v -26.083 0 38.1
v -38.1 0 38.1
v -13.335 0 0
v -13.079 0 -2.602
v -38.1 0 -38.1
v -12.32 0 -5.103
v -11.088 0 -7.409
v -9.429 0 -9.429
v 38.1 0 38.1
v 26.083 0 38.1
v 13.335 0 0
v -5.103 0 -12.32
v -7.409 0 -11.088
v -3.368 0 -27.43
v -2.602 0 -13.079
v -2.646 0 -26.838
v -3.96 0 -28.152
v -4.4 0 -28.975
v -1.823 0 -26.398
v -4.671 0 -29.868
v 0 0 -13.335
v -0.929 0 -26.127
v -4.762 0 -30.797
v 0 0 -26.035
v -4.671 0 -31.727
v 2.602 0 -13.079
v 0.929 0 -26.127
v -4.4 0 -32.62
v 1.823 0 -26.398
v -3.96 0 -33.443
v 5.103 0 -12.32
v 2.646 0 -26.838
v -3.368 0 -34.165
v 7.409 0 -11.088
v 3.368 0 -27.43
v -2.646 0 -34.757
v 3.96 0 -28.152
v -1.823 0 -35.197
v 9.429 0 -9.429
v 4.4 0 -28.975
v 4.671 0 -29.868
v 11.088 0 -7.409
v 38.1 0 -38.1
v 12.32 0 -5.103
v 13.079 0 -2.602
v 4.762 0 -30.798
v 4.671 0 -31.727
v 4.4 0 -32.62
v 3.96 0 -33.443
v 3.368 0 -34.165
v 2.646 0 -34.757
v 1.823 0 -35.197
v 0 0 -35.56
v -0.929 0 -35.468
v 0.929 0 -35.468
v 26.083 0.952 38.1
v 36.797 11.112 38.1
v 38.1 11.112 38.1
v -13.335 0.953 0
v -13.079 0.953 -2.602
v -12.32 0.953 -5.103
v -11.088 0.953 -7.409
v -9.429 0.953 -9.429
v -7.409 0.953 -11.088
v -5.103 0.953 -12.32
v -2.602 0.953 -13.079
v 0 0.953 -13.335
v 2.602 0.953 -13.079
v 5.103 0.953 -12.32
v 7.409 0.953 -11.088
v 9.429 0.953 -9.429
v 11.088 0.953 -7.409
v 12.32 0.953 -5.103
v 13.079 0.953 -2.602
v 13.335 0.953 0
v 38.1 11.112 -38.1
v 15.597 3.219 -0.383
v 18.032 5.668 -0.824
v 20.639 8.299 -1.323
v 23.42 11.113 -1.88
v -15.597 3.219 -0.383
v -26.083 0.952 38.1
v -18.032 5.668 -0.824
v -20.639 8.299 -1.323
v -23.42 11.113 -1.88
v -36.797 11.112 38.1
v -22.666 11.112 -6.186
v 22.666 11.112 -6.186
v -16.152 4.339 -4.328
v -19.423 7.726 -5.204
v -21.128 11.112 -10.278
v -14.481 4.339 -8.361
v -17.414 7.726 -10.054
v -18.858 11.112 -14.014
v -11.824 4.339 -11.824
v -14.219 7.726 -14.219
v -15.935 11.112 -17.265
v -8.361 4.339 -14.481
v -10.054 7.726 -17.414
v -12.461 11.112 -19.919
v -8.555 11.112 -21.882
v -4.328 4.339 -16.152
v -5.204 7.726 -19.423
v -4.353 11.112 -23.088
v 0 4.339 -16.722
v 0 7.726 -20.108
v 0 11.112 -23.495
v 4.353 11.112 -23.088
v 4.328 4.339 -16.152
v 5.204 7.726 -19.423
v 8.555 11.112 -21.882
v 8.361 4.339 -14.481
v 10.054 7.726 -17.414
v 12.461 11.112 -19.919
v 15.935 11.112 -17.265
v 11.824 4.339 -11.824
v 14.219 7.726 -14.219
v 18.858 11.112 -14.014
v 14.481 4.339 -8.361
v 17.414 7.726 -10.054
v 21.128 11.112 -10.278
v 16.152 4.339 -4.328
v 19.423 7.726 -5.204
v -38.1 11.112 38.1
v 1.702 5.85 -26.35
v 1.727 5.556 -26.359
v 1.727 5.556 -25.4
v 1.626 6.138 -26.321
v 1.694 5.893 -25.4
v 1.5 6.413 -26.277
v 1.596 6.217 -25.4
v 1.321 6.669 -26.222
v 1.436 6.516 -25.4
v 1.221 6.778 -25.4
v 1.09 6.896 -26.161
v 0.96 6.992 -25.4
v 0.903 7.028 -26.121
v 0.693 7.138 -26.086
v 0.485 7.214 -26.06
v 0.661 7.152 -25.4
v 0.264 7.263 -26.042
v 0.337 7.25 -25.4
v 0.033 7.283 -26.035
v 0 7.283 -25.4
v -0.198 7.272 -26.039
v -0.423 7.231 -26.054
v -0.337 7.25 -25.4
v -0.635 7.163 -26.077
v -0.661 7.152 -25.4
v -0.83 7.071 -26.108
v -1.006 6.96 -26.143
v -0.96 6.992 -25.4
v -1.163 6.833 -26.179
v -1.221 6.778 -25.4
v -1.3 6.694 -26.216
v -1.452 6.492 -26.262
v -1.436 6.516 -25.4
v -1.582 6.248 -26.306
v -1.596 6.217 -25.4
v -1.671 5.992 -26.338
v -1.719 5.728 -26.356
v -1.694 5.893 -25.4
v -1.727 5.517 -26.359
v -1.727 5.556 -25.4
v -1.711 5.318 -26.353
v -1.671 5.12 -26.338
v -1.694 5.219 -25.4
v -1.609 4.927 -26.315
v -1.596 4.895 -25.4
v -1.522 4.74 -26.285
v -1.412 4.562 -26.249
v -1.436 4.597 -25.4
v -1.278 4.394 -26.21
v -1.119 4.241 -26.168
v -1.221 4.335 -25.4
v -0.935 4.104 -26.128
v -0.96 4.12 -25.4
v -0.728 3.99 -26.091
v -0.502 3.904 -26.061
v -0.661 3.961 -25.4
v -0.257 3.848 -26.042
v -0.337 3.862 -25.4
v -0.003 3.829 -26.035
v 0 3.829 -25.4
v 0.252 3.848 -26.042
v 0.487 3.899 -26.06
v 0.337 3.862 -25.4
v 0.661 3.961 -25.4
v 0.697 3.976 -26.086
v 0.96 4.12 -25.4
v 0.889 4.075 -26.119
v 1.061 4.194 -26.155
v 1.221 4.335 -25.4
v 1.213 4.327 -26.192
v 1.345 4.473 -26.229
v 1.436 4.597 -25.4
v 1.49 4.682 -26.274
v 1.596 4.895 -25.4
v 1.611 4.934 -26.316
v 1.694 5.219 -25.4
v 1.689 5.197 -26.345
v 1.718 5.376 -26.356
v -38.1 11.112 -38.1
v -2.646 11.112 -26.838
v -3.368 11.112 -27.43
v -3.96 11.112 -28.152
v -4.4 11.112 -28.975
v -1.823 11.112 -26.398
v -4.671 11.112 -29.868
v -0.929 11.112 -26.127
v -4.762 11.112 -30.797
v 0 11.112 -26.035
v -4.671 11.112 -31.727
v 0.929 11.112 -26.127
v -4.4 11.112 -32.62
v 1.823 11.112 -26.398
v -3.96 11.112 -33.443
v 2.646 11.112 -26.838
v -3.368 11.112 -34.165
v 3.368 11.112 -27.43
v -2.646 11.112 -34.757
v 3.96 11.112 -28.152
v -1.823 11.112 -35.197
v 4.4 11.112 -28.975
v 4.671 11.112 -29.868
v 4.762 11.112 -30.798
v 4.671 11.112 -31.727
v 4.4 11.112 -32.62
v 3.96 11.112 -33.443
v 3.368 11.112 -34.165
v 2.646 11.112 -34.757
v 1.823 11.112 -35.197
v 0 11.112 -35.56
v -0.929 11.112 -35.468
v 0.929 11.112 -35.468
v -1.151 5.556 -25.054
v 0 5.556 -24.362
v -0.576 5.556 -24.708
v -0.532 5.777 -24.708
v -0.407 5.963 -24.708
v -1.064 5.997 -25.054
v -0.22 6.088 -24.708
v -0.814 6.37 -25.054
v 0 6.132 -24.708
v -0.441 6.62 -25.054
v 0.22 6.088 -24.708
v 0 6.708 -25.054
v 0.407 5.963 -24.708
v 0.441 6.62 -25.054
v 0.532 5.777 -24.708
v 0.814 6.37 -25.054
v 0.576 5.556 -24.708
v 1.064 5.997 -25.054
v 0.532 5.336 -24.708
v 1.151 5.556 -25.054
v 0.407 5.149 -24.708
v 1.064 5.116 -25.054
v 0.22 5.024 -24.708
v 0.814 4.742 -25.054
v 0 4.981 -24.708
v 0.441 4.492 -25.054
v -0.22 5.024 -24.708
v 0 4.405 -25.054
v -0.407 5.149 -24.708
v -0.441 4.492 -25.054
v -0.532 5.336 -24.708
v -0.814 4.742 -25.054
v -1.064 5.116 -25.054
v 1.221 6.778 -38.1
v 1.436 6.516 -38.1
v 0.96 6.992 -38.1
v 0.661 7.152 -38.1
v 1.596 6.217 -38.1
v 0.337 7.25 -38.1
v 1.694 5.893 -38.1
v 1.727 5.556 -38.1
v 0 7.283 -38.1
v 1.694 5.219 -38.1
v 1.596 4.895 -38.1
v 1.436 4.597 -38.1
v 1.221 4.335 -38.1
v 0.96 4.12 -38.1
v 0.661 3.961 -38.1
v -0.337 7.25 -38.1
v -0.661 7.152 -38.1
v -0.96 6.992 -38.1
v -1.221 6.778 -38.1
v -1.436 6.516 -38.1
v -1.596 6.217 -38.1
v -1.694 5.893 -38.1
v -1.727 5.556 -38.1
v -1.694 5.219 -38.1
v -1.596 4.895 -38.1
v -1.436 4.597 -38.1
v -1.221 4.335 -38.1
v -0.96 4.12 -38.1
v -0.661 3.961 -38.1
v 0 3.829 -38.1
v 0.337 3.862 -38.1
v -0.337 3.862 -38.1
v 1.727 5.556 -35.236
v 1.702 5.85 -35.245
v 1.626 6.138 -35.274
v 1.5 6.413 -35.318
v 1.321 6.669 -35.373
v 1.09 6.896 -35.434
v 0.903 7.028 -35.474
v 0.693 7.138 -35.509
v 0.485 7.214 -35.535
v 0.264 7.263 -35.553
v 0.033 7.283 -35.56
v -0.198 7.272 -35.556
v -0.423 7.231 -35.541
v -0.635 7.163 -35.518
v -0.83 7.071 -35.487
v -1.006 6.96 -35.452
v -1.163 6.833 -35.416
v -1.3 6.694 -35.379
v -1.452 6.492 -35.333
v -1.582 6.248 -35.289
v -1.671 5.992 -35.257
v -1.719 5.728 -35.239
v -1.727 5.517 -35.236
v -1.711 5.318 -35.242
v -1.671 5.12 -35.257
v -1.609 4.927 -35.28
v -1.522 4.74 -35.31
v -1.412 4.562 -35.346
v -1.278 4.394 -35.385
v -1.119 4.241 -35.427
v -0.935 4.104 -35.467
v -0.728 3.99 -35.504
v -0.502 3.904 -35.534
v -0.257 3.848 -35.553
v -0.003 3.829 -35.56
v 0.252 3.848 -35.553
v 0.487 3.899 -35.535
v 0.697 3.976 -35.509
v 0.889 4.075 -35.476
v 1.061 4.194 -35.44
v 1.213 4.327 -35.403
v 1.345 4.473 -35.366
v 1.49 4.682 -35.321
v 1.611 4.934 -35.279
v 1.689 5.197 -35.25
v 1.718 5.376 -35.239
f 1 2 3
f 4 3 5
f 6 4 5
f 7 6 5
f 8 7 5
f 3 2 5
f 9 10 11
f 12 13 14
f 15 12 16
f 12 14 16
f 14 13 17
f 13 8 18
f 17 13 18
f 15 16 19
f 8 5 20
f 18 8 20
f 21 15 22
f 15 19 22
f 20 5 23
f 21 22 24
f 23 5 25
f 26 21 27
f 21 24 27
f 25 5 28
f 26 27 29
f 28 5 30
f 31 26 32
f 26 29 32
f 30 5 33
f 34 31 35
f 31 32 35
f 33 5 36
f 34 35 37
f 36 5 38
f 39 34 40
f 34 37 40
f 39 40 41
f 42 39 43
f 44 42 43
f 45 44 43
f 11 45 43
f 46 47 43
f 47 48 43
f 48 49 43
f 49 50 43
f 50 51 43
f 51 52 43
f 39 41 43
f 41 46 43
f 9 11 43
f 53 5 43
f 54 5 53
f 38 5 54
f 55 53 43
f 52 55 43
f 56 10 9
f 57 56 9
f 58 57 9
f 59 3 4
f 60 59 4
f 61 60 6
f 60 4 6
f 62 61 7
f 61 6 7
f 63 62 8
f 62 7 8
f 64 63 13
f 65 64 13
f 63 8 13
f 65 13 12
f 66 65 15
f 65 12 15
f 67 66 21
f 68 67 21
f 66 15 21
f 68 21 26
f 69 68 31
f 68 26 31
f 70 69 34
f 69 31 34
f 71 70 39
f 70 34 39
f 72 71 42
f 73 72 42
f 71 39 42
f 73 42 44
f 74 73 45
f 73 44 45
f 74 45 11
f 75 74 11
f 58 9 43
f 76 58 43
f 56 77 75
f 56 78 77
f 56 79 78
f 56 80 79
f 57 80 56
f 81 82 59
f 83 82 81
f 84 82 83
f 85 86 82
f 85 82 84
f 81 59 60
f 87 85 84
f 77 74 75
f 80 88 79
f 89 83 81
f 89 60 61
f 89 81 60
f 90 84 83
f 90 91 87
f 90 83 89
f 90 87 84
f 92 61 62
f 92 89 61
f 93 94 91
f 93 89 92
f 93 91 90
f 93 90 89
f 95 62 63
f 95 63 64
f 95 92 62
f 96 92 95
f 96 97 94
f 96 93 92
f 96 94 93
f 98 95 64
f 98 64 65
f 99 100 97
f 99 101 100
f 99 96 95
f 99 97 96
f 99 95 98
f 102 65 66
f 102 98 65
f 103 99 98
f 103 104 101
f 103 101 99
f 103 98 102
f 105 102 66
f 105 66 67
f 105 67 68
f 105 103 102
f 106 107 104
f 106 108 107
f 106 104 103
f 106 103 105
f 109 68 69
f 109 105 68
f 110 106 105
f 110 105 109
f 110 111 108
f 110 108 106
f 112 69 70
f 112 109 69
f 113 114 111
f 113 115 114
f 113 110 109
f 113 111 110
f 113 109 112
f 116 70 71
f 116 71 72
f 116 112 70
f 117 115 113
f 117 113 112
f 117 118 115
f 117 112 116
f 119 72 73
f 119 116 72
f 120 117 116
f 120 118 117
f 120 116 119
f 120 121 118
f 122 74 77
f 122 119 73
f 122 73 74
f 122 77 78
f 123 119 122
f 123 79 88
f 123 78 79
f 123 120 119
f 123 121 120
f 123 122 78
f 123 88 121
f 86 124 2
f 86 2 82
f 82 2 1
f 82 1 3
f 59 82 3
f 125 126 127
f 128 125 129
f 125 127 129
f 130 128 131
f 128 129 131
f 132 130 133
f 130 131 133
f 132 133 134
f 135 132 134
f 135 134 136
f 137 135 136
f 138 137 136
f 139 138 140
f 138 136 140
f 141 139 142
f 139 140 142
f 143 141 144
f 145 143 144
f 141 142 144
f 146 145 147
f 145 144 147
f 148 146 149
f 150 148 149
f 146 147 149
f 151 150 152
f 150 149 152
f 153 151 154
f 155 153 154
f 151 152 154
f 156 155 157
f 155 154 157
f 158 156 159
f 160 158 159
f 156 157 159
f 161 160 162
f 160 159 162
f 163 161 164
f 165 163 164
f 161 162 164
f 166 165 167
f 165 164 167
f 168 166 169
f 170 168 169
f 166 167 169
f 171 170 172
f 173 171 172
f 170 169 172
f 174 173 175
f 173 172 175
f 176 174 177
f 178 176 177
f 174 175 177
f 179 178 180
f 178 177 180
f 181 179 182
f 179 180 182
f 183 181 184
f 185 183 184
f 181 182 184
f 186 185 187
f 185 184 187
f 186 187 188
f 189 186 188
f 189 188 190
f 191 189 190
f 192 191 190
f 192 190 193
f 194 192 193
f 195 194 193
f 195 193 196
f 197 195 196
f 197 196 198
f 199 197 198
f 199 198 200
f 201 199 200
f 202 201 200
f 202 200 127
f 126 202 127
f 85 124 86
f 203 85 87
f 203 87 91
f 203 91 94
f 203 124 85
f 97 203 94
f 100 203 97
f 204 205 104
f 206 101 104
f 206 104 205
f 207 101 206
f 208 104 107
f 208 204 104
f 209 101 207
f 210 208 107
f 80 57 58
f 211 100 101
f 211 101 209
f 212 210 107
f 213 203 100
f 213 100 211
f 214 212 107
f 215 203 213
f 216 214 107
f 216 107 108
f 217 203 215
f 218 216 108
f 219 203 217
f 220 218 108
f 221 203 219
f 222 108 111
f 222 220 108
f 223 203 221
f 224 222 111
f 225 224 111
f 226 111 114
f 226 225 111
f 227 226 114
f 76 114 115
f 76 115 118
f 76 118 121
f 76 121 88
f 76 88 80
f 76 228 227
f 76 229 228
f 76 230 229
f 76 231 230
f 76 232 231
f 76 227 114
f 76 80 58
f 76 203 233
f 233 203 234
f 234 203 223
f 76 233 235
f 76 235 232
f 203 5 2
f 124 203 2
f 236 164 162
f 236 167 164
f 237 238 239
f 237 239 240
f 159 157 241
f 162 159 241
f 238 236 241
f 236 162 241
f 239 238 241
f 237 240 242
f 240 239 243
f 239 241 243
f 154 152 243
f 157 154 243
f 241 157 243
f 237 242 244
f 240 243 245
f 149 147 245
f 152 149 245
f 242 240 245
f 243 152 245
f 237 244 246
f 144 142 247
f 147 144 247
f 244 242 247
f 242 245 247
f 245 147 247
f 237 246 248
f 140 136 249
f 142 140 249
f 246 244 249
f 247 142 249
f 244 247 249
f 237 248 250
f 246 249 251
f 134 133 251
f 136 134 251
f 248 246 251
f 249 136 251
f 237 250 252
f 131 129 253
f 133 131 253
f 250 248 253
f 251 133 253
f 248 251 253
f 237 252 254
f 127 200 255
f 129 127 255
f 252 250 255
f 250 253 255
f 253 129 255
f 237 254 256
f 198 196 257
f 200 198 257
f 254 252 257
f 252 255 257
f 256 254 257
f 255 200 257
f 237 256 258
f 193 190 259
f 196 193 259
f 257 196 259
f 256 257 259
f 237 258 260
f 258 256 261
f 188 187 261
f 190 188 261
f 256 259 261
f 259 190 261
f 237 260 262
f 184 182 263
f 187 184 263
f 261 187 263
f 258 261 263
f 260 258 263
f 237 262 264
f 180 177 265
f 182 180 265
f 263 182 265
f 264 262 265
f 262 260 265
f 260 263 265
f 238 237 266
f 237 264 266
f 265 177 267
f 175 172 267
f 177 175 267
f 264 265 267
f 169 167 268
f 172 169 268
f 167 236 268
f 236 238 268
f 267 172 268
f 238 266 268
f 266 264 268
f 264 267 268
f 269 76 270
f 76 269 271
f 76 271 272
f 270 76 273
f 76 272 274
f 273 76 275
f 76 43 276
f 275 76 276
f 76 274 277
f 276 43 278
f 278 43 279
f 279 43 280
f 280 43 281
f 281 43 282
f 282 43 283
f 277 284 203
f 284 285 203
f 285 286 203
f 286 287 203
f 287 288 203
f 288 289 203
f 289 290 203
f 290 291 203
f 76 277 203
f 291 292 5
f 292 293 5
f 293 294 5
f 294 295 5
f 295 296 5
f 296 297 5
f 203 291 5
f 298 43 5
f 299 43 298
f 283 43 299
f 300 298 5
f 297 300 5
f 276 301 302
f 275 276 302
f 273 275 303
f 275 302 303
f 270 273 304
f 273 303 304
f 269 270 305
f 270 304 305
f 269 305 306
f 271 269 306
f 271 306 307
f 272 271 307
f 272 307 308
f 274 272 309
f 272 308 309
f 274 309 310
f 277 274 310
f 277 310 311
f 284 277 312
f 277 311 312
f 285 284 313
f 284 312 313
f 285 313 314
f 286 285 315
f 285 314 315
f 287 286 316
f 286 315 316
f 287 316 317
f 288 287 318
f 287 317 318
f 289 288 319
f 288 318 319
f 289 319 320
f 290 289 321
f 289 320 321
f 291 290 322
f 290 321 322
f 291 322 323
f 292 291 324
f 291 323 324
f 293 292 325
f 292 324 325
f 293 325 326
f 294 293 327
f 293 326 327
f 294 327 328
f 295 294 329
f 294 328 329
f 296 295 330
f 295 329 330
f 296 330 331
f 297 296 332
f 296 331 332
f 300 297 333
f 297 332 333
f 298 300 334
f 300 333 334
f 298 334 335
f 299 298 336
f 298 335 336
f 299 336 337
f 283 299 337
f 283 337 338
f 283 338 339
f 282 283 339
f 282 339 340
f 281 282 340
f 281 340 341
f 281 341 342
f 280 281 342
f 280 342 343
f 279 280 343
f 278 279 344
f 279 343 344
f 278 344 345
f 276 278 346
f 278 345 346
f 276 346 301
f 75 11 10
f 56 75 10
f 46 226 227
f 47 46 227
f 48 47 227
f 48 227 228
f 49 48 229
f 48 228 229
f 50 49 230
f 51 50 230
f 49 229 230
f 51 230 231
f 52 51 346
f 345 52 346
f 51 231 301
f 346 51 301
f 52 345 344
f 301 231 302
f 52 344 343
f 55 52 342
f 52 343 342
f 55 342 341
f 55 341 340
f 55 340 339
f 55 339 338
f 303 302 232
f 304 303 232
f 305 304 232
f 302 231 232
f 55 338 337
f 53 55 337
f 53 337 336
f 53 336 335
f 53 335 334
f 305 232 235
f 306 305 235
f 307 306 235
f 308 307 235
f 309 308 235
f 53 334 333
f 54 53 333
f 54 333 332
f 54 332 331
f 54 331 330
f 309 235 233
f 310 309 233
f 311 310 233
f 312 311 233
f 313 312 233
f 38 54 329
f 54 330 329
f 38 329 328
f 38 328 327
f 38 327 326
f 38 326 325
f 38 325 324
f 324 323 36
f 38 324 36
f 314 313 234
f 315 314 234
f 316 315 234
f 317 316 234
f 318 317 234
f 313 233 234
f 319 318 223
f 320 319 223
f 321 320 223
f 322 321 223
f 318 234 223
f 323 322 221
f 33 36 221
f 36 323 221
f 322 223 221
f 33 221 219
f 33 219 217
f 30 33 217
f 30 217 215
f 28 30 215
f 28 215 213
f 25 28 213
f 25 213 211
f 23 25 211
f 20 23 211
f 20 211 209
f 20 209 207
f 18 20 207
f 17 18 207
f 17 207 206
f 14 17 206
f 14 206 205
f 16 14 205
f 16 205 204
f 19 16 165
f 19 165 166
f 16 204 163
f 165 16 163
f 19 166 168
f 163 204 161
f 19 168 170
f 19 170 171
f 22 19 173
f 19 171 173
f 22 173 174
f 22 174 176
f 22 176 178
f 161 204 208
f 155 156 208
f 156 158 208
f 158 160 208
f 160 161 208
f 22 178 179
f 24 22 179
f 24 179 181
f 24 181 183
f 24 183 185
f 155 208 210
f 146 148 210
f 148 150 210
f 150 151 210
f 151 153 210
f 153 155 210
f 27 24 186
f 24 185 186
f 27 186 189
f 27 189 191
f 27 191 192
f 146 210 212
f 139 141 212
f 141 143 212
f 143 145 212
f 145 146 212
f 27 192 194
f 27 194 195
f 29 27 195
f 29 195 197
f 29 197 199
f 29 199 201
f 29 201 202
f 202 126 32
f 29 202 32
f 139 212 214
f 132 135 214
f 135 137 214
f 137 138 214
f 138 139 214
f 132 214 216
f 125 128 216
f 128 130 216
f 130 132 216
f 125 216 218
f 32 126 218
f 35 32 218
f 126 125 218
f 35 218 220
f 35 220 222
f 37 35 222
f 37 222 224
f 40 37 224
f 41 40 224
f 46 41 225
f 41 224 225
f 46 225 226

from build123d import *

# Parameters (mm, degrees)
BOSS_EXTRUDE1_DEPTH           = 11.1125
CHAMFER1_SIZE                 = 10.16
TAP_DRILL_FOR_8_32_TAP1_D     = 3.4544
TAP_DRILL_FOR_8_32_TAP1_DEPTH = 12.7
TAP_DRILL_FOR_8_32_TAP1_TIP   = 1.037806461
SKETCH27_R                    = 4.7625
CUT_EXTRUDE1_DEPTH            = 12.1125


with BuildPart() as part:
    # Sketch1 → Boss-Extrude1 (new body)
    with BuildSketch(Plane(origin=(0, 0, 0), x_dir=(1, 0, 0), z_dir=(0, 1, 0))):
        with BuildLine():
            Line((-26.083081673, -38.1), (-13.335, 0))
            ThreePointArc((-13.335, 0), (0, 13.335), (13.335, 0))
            Line((13.335, 0), (26.083081673, -38.1))
            Line((26.083081673, -38.1), (38.1, -38.1))
            Line((38.1, -38.1), (38.1, 38.1))
            Line((38.1, 38.1), (-38.1, 38.1))
            Line((-38.1, 38.1), (-38.1, -38.1))
            Line((-38.1, -38.1), (-26.083081673, -38.1))
        make_face()
    extrude(amount=BOSS_EXTRUDE1_DEPTH)

    # Chamfer1
    chamfer1_edges = [part.edges().sort_by_distance(p)[0] for p in [
        (19.709040837, 11.1125, 19.05),
        (-19.709040837, 11.1125, 19.05),
        (0, 11.1125, -13.335),
    ]]
    chamfer(chamfer1_edges, length=CHAMFER1_SIZE)

    # Tap Drill for #8-32 Tap1
    with Locations(Plane(origin=(0, 5.55625, -38.1), x_dir=(-1, 0, 0), z_dir=(0, 0, -1))):
        with Locations((0, 0)):
            Hole(TAP_DRILL_FOR_8_32_TAP1_D / 2, depth=TAP_DRILL_FOR_8_32_TAP1_DEPTH)
            with Locations((0, 0, -(TAP_DRILL_FOR_8_32_TAP1_DEPTH + TAP_DRILL_FOR_8_32_TAP1_TIP / 2))):  # 118° drill point
                Cone(0, TAP_DRILL_FOR_8_32_TAP1_D / 2, TAP_DRILL_FOR_8_32_TAP1_TIP, mode=Mode.SUBTRACT)

    # Sketch27 → Cut-Extrude1 (cut, through all)
    with BuildSketch(Plane(origin=(0, 11.1125, 0), x_dir=(1, 0, 0), z_dir=(0, 1, 0))):
        with Locations((0, 30.7975)):
            Circle(SKETCH27_R)
    extrude(amount=-CUT_EXTRUDE1_DEPTH, mode=Mode.SUBTRACT)


solid = part.part
